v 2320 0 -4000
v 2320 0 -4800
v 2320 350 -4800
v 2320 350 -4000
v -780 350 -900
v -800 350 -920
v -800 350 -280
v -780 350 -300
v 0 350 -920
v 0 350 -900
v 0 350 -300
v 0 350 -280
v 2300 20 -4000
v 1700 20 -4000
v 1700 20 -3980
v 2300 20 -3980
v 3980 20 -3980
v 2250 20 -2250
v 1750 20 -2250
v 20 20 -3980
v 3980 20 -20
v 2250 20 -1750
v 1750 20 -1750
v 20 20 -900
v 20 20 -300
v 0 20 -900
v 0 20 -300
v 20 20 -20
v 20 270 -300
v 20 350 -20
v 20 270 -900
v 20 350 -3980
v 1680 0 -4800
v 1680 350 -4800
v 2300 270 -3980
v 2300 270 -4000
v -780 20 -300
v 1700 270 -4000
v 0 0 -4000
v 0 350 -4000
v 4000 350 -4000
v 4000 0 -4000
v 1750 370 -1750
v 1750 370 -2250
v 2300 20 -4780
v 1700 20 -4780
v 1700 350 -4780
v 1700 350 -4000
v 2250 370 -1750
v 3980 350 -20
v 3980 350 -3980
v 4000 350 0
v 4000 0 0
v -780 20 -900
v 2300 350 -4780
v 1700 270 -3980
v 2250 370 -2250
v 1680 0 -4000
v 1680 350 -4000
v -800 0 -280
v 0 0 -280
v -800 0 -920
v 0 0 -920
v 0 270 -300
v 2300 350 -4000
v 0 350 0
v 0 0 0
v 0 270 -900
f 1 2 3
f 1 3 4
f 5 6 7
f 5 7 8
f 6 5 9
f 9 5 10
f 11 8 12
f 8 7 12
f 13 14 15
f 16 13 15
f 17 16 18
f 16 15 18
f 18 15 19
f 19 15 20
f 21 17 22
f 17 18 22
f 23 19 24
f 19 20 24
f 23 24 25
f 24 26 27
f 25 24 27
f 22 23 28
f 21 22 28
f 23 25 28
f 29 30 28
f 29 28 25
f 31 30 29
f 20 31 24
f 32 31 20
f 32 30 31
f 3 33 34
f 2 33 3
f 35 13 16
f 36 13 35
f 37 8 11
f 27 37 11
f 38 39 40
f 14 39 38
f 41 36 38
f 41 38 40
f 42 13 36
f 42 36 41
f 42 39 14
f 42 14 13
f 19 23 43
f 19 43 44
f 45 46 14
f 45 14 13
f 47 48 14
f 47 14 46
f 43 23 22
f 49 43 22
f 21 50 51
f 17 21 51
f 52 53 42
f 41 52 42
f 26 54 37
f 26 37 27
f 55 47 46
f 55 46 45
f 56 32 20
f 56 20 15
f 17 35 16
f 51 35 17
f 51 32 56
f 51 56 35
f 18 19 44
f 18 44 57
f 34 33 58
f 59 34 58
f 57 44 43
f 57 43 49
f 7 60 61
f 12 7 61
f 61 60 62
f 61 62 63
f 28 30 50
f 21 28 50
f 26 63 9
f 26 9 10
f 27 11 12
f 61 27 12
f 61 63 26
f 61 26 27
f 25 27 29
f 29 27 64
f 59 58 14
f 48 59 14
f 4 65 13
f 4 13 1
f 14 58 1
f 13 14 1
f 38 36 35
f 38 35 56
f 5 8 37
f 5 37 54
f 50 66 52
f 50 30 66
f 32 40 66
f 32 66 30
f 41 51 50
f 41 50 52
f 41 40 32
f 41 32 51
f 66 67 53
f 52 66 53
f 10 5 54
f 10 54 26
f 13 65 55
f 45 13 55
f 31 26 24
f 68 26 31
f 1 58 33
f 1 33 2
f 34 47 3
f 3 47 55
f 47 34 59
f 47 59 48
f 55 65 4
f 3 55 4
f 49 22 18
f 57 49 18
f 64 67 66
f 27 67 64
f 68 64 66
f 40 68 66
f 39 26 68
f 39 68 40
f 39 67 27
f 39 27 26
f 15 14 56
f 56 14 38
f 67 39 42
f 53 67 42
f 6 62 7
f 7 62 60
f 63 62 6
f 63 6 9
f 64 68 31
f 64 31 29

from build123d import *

# Parameters (mm, degrees)
SKETCH_1_W          = 4000
SKETCH_1_H          = 4000
EXTRUDE_1_DEPTH     = 350
SKETCH_2_W          = 3960
SKETCH_2_H          = 3960
CUT_EXTRUDE_1_DEPTH = 330
SKETCH_3_W          = 600
SKETCH_3_H          = 250
CUT_EXTRUDE_2_DEPTH = 20
SKETCH_5_W          = 600
SKETCH_5_H          = 250
CUT_EXTRUDE_3_DEPTH = 20
SKETCH_6_W          = 500
SKETCH_6_H          = 500
EXTRUDE_2_DEPTH     = 350
SKETCH_19_W         = 640
SKETCH_19_H         = 800
EXTRUDE_10_DEPTH    = 350
SKETCH_19_W_2       = 800
SKETCH_19_H_2       = 640
EXTRUDE_10_2_DEPTH  = 350
SKETCH_20_W         = 600
SKETCH_20_H         = 780
SKETCH_20_W_2       = 780
SKETCH_20_H_2       = 600
CUT_EXTRUDE_7_DEPTH = 330


with BuildPart() as part:
    # 草图1 → 凸台-拉伸1 (new body)
    with BuildSketch(Plane(origin=(0, 0, 0), x_dir=(1, 0, 0), z_dir=(0, 1, 0))):
        with Locations((2000, 2000)):
            Rectangle(SKETCH_1_W, SKETCH_1_H)
    extrude(amount=EXTRUDE_1_DEPTH)

    # 草图2 → 切除-拉伸1 (cut)
    with BuildSketch(Plane(origin=(0, 350, 0), x_dir=(1, 0, 0), z_dir=(0, 1, 0))):
        with Locations((2000, 2000)):
            Rectangle(SKETCH_2_W, SKETCH_2_H)
    extrude(amount=-CUT_EXTRUDE_1_DEPTH, mode=Mode.SUBTRACT)

    # 草图3 → 切除-拉伸2 (cut)
    with BuildSketch(Plane(origin=(0, 0, -4000), x_dir=(-1, 0, 0), z_dir=(0, 0, -1))):
        with Locations((-2000, 145)):
            Rectangle(SKETCH_3_W, SKETCH_3_H)
    extrude(amount=-CUT_EXTRUDE_2_DEPTH, mode=Mode.SUBTRACT)

    # 草图5 → 切除-拉伸3 (cut)
    with BuildSketch(Plane.ZY):
        with Locations((-600, 145)):
            Rectangle(SKETCH_5_W, SKETCH_5_H)
    extrude(amount=-CUT_EXTRUDE_3_DEPTH, mode=Mode.SUBTRACT)

    # 草图6 → 凸台-拉伸2 (add)
    with BuildSketch(Plane(origin=(0, 20, 0), x_dir=(1, 0, 0), z_dir=(0, 1, 0))):
        with Locations((2000, 2000)):
            Rectangle(SKETCH_6_W, SKETCH_6_H)
    extrude(amount=EXTRUDE_2_DEPTH)


with BuildPart() as body_2:
    # 草图19 → 凸台-拉伸10 (new body)
    with BuildSketch(Plane.XZ):
        with Locations((2000, -4400)):
            Rectangle(SKETCH_19_W, SKETCH_19_H)
    extrude(amount=-EXTRUDE_10_DEPTH)


with BuildPart() as body_3:
    # 草图19 → Extrude 10 2 (new body)
    with BuildSketch(Plane.XZ):
        with Locations((-400, -600)):
            Rectangle(SKETCH_19_W_2, SKETCH_19_H_2)
    extrude(amount=-EXTRUDE_10_2_DEPTH)


with BuildPart() as cut_extrude_7_tool:
    # 草图20 → 切除-拉伸7 (new body)
    with BuildSketch(Plane(origin=(0, 350, 0), x_dir=(1, 0, 0), z_dir=(0, 1, 0))):
        with Locations((2000, 4390)):
            Rectangle(SKETCH_20_W, SKETCH_20_H)
        with Locations((-390, 600)):
            Rectangle(SKETCH_20_W_2, SKETCH_20_H_2)
    extrude(amount=-CUT_EXTRUDE_7_DEPTH)


with BuildPart() as body_2_1:
    add(body_2.part)

    # 切除-拉伸7: cut by cut_extrude_7_tool
    add(cut_extrude_7_tool.part, mode=Mode.SUBTRACT)


with BuildPart() as body_3_1:
    add(body_3.part)

    # 切除-拉伸7: cut by cut_extrude_7_tool
    add(cut_extrude_7_tool.part, mode=Mode.SUBTRACT)


solid = Compound([part.part, body_2_1.part, body_3_1.part])
